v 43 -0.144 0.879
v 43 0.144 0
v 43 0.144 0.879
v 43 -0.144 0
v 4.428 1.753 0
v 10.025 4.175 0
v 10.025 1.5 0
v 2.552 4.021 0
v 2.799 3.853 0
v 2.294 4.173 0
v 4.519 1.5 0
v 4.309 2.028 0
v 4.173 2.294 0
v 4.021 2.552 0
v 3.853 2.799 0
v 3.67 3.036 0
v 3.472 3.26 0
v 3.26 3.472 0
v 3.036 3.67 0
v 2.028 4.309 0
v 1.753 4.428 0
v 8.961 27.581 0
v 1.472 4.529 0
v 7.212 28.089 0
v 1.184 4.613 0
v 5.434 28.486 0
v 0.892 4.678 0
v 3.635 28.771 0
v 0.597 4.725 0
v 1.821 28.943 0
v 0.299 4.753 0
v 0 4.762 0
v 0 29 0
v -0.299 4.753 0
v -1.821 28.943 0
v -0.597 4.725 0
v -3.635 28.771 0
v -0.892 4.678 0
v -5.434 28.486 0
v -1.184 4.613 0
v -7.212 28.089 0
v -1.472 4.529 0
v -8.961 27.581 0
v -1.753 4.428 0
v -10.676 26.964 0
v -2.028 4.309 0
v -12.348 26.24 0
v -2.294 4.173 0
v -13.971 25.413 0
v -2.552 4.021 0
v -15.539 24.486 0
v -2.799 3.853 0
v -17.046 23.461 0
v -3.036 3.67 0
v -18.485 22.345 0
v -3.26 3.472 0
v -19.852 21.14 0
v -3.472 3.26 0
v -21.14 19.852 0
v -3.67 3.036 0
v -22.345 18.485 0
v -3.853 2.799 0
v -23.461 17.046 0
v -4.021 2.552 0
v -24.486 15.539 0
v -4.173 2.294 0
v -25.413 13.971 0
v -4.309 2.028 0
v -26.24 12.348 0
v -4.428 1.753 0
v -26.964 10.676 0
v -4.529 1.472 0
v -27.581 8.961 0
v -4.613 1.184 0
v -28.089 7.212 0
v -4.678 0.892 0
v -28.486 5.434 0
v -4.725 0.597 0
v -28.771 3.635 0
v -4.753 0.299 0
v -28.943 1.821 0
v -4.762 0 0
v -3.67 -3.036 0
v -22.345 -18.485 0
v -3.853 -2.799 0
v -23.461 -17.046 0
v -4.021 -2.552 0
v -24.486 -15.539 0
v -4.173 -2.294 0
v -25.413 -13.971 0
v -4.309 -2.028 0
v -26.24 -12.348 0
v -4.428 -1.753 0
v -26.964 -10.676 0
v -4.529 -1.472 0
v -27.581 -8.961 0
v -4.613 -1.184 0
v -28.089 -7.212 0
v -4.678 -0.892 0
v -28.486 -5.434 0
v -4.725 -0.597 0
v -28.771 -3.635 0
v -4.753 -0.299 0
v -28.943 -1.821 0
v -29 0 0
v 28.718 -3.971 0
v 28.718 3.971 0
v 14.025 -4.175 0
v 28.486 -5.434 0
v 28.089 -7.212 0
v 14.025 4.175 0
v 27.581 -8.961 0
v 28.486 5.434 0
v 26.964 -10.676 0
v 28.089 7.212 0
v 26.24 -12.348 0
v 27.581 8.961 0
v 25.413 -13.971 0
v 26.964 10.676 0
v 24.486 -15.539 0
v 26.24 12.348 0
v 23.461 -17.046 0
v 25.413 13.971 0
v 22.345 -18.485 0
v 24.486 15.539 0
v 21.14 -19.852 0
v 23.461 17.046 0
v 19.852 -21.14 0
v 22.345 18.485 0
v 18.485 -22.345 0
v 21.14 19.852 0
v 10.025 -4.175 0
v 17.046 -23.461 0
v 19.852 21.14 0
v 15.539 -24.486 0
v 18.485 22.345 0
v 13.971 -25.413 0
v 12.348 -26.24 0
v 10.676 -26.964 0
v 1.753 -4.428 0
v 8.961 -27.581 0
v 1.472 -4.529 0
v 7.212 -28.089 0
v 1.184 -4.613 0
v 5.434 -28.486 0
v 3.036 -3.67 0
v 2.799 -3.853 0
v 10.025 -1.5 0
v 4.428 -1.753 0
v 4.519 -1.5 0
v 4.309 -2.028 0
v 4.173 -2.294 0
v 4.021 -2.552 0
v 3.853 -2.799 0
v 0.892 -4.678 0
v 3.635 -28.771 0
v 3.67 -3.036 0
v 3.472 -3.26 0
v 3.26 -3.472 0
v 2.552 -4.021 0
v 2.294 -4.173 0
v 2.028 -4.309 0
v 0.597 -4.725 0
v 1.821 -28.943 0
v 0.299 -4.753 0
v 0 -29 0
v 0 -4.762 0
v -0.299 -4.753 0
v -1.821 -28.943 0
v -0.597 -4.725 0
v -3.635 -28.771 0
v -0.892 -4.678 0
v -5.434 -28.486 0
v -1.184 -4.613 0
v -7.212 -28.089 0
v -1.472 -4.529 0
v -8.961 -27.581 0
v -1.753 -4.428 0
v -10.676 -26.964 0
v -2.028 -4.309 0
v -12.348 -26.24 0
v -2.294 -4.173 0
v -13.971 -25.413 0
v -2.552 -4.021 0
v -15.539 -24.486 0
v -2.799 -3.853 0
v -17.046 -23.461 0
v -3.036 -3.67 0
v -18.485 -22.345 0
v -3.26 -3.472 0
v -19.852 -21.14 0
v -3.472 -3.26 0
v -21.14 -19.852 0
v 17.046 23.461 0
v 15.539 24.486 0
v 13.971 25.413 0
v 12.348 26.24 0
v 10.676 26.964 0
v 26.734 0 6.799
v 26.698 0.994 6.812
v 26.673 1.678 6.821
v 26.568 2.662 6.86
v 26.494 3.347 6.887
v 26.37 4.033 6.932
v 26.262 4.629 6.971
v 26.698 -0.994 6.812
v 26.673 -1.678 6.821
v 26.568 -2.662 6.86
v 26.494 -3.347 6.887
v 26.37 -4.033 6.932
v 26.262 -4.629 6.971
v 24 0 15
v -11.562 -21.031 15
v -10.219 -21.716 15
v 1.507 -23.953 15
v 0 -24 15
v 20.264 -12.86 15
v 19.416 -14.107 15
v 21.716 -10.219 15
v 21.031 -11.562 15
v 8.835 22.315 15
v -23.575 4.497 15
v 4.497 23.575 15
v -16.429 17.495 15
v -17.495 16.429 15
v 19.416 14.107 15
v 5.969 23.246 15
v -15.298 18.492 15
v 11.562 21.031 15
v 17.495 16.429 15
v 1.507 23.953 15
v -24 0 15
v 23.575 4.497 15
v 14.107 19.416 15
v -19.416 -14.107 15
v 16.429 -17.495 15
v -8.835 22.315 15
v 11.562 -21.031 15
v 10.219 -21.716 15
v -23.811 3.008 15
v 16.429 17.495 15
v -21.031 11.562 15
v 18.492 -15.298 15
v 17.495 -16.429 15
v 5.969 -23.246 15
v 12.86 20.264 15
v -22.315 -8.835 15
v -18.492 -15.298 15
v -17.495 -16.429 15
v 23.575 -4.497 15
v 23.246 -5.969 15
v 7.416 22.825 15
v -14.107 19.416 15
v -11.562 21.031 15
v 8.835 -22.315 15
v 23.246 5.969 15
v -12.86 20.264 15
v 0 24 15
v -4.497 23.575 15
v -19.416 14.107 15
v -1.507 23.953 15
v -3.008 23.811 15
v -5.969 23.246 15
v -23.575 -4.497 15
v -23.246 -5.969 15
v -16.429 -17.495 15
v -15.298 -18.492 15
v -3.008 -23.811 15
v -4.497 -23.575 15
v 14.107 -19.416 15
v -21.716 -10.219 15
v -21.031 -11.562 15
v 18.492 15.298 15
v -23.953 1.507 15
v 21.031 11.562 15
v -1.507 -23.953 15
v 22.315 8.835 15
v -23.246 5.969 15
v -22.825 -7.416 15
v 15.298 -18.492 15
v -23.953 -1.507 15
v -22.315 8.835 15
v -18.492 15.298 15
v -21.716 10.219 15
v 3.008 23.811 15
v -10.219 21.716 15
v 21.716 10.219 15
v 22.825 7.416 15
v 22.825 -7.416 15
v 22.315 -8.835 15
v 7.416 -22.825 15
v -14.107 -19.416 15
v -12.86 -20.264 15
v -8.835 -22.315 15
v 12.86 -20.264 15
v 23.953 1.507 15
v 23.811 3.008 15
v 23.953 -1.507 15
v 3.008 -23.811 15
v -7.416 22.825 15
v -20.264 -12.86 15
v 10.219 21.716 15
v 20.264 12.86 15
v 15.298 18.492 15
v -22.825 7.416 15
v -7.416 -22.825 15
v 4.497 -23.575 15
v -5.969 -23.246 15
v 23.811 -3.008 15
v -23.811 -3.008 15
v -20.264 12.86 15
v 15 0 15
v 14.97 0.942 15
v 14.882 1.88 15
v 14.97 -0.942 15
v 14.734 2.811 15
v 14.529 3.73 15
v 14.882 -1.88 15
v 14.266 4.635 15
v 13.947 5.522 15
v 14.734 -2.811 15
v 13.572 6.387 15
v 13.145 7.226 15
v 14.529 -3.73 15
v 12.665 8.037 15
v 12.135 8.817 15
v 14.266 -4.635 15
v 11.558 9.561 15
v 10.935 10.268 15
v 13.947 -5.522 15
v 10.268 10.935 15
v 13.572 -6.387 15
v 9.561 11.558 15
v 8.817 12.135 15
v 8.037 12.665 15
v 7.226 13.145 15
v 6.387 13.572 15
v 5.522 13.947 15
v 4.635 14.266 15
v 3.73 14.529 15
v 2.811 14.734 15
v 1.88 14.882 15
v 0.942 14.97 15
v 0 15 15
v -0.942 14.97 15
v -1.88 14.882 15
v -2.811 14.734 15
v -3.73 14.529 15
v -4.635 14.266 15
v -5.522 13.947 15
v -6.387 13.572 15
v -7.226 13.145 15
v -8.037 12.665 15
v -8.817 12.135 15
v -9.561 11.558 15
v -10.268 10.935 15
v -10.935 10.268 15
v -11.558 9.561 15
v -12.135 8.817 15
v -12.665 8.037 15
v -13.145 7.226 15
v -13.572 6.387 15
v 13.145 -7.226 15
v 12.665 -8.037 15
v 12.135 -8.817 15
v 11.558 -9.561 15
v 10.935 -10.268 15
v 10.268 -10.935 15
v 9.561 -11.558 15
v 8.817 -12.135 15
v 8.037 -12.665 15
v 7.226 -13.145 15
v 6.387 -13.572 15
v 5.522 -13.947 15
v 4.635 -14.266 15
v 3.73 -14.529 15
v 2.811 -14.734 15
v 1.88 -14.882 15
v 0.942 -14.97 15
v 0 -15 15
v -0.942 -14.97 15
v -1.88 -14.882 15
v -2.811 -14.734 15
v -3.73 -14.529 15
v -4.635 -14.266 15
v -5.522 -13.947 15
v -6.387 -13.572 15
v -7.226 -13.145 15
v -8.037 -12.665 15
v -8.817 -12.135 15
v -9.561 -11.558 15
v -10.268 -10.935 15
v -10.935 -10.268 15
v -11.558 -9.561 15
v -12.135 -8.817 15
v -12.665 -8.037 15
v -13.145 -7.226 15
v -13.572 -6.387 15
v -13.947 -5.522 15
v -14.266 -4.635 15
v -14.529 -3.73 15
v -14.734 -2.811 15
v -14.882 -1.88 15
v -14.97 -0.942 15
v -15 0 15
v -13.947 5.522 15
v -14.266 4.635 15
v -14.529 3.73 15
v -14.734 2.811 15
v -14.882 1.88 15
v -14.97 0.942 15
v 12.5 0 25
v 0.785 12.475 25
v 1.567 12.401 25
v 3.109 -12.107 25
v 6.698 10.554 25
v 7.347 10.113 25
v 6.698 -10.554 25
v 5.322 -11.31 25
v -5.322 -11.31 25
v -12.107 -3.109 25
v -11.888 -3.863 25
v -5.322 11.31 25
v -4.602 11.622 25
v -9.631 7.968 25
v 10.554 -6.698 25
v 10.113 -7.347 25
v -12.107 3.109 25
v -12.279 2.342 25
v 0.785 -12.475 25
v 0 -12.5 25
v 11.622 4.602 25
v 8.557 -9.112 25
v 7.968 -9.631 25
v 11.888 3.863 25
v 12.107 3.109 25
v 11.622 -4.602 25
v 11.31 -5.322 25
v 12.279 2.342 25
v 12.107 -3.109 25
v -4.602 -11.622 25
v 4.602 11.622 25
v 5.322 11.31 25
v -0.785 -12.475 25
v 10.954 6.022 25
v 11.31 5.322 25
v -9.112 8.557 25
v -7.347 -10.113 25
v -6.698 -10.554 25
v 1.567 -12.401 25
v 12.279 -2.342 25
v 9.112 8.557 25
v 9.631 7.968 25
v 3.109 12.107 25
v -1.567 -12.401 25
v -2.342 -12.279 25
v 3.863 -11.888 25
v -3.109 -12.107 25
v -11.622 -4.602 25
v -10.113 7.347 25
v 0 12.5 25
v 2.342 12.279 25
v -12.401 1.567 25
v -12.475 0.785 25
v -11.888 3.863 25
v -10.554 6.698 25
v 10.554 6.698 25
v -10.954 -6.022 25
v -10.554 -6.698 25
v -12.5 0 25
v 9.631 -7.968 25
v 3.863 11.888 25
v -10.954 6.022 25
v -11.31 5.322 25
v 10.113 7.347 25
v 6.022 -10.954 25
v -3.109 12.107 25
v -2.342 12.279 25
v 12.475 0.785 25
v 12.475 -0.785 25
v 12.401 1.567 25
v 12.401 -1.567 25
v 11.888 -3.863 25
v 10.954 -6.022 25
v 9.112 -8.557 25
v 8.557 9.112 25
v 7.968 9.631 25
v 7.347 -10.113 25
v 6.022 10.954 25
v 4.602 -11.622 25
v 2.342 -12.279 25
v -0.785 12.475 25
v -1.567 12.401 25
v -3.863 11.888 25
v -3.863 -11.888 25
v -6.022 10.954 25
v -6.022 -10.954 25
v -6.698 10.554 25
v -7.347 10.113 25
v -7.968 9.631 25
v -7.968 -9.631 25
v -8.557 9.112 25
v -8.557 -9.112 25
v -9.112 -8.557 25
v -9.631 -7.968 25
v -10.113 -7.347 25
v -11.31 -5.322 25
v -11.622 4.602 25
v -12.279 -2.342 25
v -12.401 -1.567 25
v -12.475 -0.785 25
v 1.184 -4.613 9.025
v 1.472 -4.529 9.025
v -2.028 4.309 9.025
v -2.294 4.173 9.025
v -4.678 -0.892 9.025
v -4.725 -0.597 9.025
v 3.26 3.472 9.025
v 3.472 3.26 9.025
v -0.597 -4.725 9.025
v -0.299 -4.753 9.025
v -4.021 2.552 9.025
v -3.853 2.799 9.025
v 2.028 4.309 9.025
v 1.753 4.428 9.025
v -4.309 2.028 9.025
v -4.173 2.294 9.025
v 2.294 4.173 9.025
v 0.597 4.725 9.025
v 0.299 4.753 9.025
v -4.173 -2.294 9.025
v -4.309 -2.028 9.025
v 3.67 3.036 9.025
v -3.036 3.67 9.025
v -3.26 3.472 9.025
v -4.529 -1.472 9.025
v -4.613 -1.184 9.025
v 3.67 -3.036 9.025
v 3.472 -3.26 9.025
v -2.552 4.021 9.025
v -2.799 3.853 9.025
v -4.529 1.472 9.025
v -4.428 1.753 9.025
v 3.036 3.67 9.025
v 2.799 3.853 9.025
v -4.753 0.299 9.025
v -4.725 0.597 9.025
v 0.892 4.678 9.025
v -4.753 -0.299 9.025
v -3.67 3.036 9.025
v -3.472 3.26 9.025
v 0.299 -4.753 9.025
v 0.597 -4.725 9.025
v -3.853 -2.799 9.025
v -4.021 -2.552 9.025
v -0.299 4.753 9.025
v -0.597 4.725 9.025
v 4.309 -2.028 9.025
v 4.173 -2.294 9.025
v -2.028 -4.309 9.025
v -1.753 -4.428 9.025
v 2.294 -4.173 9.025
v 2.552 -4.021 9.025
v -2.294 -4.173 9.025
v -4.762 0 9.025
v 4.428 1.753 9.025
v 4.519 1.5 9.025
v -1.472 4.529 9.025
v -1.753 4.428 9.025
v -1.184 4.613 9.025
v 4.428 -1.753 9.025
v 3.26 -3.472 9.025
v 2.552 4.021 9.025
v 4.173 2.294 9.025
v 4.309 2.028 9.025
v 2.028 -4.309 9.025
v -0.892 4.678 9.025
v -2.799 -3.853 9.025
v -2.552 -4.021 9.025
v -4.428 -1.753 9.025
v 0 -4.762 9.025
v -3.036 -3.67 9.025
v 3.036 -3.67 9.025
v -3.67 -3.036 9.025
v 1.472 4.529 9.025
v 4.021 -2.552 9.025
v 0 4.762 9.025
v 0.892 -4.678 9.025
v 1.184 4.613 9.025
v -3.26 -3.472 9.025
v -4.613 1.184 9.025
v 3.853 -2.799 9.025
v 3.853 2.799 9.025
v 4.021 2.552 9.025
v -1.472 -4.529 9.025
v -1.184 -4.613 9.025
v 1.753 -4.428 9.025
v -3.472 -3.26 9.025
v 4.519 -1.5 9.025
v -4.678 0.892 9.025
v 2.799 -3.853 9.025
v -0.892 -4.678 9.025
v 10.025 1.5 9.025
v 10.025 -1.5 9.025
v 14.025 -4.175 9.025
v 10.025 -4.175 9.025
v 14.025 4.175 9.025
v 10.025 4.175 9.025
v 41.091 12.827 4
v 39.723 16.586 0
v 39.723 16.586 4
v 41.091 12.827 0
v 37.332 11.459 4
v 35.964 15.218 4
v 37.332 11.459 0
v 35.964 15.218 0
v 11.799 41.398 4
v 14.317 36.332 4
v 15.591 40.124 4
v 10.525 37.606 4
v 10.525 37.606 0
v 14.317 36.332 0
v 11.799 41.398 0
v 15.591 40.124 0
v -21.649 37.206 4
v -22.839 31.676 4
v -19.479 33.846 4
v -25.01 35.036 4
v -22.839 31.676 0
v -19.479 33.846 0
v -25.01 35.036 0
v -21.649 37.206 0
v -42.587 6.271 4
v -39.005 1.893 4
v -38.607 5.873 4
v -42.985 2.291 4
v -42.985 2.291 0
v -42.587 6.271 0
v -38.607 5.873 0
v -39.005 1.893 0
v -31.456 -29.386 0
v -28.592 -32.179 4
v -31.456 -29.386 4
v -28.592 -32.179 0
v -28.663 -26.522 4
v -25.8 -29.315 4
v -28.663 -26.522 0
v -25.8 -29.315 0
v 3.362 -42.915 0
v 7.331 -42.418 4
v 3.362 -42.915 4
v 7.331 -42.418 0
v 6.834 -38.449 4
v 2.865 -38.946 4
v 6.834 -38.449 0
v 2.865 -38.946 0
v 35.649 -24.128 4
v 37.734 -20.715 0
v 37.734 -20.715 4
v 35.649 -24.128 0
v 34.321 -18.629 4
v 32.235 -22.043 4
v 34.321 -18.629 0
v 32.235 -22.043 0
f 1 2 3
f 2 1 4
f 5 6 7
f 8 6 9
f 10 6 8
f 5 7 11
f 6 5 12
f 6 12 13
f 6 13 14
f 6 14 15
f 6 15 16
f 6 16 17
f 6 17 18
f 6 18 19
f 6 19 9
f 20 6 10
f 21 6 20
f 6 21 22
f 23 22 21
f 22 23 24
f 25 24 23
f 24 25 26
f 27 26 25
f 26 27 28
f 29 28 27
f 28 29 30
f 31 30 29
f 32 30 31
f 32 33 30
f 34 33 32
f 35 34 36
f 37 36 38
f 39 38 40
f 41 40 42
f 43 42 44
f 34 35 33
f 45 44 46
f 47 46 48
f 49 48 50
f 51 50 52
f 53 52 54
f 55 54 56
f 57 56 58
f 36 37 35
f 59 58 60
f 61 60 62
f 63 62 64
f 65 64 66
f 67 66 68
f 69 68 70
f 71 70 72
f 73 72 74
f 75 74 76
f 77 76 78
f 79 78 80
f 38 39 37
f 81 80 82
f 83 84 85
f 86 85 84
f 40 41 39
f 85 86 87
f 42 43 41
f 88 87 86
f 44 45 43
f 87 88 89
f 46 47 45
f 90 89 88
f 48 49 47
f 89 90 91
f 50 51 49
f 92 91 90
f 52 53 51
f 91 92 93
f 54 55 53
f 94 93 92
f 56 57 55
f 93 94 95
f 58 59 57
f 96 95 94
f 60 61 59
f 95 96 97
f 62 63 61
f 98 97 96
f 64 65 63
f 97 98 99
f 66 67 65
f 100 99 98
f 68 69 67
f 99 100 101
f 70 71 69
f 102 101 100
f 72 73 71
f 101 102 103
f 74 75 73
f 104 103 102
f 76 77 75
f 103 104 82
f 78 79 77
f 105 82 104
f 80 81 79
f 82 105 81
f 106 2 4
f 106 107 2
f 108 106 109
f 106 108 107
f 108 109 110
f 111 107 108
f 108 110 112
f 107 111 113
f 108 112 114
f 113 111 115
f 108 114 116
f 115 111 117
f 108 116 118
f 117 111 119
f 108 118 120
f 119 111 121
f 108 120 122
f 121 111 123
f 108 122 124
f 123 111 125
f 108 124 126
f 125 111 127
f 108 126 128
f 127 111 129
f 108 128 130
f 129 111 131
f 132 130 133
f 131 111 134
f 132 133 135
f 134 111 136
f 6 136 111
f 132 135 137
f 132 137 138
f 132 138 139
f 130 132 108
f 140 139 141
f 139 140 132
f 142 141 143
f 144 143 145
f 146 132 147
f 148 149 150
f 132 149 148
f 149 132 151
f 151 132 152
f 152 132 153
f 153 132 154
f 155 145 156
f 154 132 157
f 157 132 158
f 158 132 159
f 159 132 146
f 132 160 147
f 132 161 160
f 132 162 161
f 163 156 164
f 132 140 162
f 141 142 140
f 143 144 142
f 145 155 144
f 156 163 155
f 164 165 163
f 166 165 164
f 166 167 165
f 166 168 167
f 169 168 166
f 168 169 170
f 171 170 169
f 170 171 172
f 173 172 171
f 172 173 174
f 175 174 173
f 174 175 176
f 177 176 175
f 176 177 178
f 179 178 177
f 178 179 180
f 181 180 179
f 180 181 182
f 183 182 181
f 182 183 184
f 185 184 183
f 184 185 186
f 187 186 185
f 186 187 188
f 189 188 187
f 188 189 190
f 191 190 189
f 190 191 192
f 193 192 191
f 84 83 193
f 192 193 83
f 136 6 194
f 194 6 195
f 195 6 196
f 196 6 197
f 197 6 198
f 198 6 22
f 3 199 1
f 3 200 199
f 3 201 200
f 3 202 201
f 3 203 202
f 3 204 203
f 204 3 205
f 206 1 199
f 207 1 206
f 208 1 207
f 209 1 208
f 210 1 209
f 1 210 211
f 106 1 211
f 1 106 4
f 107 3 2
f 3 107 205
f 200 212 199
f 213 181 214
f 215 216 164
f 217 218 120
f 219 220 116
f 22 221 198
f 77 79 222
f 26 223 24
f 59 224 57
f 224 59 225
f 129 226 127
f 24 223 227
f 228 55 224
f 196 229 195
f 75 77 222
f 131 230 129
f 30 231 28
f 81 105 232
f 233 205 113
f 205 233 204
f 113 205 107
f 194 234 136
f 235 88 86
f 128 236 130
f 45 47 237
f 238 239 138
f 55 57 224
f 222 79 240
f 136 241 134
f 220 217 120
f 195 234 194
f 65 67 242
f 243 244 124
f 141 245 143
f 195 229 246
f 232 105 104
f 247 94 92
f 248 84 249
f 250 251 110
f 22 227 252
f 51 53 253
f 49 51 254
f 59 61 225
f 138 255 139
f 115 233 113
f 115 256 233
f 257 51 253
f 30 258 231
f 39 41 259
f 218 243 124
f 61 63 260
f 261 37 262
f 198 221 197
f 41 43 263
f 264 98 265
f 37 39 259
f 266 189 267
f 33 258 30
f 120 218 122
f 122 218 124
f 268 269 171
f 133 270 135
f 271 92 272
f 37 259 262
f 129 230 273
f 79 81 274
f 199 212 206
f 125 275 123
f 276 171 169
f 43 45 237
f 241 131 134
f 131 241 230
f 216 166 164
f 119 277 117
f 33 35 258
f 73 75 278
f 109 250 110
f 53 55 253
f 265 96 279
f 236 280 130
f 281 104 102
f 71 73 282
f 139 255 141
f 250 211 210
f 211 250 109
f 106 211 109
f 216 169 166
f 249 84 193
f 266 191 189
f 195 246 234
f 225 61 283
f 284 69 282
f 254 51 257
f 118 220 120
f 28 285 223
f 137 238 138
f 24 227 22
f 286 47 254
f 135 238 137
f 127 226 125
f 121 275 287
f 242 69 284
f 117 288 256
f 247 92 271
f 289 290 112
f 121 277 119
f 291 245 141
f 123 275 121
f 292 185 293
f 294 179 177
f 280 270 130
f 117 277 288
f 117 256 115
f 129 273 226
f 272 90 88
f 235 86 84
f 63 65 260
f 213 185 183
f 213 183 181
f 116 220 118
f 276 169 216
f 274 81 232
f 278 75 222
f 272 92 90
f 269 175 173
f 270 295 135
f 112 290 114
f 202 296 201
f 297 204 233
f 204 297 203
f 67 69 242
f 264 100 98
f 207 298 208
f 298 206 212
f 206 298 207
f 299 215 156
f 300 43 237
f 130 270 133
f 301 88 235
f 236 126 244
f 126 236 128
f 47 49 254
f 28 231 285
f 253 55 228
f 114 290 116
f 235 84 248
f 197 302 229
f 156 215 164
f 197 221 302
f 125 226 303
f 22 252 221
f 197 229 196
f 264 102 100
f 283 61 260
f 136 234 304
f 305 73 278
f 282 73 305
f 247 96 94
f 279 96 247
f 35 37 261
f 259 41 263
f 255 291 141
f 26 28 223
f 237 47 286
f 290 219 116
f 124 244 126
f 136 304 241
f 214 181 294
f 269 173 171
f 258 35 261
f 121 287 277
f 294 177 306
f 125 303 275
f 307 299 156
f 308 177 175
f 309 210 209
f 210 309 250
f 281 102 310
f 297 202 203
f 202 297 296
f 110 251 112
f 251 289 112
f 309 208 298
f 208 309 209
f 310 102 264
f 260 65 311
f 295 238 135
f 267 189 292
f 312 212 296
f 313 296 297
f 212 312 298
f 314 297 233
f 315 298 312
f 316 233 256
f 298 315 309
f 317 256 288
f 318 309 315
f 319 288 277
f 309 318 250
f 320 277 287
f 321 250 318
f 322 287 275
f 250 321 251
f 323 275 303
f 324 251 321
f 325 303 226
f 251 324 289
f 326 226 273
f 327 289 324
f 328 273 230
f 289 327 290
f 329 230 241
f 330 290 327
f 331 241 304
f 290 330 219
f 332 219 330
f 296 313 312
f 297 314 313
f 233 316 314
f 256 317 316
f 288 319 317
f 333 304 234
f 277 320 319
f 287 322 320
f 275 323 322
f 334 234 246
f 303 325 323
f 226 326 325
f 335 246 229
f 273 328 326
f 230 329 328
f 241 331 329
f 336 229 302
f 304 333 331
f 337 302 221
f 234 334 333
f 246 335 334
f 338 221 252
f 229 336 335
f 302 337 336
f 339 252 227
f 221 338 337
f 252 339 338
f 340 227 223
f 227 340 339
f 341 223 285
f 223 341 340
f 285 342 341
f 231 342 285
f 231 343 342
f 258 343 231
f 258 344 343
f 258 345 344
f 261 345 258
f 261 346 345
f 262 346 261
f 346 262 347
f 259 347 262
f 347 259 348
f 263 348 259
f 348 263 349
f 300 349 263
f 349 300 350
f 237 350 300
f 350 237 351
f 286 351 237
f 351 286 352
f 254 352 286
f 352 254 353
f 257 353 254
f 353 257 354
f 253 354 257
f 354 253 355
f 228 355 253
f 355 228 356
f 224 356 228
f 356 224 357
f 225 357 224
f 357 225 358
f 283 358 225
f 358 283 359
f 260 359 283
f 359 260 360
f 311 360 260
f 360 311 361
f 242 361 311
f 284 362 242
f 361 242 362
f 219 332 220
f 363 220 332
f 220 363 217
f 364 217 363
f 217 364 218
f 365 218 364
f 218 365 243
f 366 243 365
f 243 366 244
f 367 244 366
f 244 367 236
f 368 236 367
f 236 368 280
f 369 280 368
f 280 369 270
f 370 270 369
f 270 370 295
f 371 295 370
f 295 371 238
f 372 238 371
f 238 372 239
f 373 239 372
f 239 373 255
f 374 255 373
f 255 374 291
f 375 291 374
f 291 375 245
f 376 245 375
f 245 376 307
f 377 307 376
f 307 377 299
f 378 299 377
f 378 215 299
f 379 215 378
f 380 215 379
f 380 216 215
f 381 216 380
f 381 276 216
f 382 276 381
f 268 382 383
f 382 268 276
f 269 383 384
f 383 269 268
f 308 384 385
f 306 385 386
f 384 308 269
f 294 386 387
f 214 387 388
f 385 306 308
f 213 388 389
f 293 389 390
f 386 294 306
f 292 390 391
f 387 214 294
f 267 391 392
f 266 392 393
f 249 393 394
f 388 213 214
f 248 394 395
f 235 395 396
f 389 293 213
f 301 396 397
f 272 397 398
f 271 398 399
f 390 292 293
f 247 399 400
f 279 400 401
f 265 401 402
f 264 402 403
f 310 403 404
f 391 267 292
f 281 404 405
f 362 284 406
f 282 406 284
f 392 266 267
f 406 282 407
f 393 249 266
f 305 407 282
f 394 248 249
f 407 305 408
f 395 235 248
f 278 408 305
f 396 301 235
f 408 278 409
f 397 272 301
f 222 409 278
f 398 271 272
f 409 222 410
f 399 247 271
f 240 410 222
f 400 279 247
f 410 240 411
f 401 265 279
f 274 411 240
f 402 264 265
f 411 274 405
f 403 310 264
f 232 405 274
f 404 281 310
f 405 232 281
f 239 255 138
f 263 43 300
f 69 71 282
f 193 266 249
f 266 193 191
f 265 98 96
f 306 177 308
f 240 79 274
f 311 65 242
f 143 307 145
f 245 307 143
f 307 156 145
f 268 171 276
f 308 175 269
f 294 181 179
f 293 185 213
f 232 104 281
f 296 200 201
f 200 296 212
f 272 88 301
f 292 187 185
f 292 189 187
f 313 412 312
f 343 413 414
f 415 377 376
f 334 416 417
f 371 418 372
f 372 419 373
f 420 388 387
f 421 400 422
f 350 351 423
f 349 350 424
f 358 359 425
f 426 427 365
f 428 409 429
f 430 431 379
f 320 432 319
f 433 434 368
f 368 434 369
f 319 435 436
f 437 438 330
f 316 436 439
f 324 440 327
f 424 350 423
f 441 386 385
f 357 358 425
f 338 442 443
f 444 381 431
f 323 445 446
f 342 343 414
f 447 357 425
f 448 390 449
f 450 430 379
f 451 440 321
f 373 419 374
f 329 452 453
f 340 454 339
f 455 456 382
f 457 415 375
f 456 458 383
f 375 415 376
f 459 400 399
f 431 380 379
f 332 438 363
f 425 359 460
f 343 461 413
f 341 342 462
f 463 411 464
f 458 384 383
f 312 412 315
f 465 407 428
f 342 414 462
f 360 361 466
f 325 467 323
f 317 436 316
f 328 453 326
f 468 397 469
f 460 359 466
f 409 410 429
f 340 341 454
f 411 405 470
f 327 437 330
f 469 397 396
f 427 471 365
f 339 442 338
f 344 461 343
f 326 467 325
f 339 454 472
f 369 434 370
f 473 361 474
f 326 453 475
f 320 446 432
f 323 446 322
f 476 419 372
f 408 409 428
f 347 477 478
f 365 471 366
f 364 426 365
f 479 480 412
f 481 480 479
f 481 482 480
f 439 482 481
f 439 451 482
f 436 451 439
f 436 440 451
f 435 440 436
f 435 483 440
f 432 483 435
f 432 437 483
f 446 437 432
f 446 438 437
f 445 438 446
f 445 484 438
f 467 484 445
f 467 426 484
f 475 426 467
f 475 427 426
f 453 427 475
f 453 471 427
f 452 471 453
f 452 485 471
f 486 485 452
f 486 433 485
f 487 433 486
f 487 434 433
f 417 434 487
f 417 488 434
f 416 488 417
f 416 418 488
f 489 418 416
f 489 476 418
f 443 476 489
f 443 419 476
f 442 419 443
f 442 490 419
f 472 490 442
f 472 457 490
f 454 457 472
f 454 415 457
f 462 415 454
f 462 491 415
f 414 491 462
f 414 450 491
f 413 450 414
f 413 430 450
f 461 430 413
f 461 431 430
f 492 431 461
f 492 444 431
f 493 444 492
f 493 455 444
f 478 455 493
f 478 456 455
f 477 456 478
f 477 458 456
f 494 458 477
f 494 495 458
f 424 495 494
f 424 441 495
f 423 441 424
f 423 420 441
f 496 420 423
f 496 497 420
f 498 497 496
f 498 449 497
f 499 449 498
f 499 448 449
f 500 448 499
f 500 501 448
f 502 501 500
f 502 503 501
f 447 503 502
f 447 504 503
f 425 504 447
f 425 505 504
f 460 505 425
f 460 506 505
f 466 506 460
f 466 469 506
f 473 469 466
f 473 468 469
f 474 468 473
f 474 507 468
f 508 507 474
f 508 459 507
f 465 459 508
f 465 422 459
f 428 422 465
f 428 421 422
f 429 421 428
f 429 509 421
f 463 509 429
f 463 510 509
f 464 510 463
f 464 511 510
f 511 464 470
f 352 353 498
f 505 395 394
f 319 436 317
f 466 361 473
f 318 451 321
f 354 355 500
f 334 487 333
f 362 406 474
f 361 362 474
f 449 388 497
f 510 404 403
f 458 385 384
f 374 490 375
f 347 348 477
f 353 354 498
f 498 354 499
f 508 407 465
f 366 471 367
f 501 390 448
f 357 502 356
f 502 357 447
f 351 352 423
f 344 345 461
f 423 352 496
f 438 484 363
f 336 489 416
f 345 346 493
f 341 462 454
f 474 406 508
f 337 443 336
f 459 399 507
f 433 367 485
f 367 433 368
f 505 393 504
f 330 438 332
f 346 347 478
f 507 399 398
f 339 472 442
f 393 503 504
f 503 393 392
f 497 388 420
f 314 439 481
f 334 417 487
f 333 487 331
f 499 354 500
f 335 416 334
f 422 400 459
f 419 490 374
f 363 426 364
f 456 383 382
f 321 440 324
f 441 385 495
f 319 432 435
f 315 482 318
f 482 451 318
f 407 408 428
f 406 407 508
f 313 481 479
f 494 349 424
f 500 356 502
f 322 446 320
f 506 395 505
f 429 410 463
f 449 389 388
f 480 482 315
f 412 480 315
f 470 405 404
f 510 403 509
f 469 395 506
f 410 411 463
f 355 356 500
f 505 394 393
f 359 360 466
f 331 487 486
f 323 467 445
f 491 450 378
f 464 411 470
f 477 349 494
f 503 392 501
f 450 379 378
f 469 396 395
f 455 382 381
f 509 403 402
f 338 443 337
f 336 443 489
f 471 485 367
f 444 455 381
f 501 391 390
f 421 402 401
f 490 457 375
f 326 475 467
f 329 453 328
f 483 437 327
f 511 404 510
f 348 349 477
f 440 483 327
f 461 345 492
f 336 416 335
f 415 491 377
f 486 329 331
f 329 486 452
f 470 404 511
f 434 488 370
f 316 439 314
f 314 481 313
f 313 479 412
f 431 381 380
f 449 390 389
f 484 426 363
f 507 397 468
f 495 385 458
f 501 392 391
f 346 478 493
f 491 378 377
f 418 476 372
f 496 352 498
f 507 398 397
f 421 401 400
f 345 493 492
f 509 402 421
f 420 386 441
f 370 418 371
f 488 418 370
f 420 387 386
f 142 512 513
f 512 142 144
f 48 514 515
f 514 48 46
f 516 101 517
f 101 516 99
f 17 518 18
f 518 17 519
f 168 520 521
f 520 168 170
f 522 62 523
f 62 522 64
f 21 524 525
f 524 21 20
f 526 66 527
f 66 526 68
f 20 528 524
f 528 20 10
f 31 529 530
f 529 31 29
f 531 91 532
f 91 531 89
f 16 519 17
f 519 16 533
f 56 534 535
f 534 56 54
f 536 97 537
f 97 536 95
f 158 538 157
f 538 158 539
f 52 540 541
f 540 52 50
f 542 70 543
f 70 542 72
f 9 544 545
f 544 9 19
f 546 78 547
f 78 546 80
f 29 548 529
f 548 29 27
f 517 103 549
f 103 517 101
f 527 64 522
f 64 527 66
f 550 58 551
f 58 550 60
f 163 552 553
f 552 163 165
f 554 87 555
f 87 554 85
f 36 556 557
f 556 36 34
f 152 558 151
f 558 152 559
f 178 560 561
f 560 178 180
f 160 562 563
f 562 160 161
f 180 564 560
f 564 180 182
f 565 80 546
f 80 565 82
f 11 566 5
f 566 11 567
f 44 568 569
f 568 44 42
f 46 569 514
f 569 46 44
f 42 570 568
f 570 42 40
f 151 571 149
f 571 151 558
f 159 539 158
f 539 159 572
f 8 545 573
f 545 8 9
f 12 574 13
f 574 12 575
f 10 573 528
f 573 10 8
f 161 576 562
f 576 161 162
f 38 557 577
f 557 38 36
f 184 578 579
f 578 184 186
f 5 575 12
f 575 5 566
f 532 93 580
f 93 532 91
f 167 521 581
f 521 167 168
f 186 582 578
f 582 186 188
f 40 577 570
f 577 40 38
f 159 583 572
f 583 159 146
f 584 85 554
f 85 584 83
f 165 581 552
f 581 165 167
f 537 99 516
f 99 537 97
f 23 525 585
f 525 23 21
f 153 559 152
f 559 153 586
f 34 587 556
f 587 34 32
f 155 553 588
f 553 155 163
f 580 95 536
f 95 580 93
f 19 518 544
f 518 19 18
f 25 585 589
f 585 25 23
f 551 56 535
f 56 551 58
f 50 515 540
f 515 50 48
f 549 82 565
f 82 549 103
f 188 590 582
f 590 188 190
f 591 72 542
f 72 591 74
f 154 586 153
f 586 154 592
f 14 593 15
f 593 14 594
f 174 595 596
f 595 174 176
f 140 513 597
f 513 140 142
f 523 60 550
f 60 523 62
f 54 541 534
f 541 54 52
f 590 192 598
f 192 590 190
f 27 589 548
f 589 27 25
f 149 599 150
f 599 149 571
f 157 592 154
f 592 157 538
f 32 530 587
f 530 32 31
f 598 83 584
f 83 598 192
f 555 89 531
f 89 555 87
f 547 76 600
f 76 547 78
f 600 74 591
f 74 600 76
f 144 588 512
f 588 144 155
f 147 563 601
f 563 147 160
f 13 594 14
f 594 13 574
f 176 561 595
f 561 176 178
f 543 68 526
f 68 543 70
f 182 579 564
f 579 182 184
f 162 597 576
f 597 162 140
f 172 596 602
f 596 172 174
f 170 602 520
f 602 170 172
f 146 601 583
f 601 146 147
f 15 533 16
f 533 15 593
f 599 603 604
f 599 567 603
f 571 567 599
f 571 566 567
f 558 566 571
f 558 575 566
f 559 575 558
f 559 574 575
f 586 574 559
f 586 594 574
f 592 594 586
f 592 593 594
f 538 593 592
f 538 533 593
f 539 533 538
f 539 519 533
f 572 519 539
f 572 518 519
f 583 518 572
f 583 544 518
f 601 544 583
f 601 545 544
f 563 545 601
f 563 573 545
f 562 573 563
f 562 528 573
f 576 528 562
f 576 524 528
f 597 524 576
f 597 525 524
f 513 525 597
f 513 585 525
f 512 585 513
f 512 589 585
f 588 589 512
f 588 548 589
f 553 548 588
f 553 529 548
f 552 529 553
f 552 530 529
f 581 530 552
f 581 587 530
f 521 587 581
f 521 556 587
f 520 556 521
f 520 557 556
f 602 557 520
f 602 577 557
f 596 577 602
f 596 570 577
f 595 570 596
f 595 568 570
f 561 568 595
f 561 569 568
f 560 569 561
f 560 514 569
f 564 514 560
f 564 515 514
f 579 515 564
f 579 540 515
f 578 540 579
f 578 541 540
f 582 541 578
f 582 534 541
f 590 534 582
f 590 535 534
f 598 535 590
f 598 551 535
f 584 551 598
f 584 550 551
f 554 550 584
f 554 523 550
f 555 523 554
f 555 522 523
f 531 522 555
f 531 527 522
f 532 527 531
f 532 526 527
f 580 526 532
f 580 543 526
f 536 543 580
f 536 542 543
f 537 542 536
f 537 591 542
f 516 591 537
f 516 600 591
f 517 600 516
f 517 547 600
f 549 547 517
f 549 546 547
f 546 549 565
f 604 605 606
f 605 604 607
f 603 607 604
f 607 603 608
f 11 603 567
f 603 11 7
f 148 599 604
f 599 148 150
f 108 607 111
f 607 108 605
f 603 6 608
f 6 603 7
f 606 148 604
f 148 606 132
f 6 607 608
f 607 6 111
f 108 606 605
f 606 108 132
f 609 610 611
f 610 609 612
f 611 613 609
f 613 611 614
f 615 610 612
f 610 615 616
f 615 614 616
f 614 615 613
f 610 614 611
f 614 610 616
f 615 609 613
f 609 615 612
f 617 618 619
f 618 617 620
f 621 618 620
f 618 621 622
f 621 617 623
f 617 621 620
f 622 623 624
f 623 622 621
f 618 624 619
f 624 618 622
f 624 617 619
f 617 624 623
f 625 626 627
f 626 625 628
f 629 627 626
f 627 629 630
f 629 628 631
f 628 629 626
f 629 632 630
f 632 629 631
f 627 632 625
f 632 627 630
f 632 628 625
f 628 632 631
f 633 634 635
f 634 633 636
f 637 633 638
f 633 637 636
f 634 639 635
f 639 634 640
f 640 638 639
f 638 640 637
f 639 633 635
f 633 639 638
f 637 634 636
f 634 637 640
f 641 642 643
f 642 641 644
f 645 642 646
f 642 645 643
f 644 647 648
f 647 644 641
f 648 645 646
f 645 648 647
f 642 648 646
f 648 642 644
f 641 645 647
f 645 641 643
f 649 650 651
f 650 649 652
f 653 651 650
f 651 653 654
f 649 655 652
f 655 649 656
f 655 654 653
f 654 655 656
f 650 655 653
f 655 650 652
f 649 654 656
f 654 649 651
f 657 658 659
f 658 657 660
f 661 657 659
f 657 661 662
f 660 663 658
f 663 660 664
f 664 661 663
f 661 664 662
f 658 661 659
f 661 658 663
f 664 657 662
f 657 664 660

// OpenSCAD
include <./ready.scad>

in = 25.4;
$fn = 100;
module arrow () {
	difference () {
		cube([20, 10, 15], center=true);
		translate([0, 0, 5]) rotate([0, 20, 0]) cube([230, 10, 15], center=true);
		translate([0, -8, 0]) rotate([0, 0, 15]) cube([230, 10, 15], center=true);
		translate([0, 8, 0]) rotate([0, 0, -15]) cube([230, 10, 15], center=true);
	}
}

module dial () {
	rod_d = (3/8) * in;
	outer_d1 = 58;
	outer_d2 = 48;
	
	dial_d1 = 30;
	dial_d2 = 25;
	dial_h2 = 10;
	
	dial_h = 15;
	difference () {
		union(){
			translate([0, 0, dial_h/2]) cylinder(r1 = outer_d1/2, r2 = outer_d2/2, h = dial_h, center =true);
			translate([0, 0, dial_h + (dial_h2/2)]) cylinder(r1 = dial_d1/2, r2 = dial_d2/2, h = dial_h2, center =true);
			translate([33, 0, 7.5]) arrow();
		}
		translate([0, 0, rod_d/2 - .5]) cylinder(r = rod_d/2, h = rod_d, center=true);
		translate([rod_d - .5, 0, rod_d/2 - .5]) cube([rod_d, 3, rod_d], center=true);
		translate([rod_d + 2.5, 0, rod_d/2 - .5]) cube([4, (in/4) + 2, rod_d], center=true);
	}
}

//intersection(){
    dial();
    rotate([0, 0, 20]) decoys(41, 2, 7);
	//translate([0, 5.5, 7]) cube([32, 11, 14], center=true);
//}
